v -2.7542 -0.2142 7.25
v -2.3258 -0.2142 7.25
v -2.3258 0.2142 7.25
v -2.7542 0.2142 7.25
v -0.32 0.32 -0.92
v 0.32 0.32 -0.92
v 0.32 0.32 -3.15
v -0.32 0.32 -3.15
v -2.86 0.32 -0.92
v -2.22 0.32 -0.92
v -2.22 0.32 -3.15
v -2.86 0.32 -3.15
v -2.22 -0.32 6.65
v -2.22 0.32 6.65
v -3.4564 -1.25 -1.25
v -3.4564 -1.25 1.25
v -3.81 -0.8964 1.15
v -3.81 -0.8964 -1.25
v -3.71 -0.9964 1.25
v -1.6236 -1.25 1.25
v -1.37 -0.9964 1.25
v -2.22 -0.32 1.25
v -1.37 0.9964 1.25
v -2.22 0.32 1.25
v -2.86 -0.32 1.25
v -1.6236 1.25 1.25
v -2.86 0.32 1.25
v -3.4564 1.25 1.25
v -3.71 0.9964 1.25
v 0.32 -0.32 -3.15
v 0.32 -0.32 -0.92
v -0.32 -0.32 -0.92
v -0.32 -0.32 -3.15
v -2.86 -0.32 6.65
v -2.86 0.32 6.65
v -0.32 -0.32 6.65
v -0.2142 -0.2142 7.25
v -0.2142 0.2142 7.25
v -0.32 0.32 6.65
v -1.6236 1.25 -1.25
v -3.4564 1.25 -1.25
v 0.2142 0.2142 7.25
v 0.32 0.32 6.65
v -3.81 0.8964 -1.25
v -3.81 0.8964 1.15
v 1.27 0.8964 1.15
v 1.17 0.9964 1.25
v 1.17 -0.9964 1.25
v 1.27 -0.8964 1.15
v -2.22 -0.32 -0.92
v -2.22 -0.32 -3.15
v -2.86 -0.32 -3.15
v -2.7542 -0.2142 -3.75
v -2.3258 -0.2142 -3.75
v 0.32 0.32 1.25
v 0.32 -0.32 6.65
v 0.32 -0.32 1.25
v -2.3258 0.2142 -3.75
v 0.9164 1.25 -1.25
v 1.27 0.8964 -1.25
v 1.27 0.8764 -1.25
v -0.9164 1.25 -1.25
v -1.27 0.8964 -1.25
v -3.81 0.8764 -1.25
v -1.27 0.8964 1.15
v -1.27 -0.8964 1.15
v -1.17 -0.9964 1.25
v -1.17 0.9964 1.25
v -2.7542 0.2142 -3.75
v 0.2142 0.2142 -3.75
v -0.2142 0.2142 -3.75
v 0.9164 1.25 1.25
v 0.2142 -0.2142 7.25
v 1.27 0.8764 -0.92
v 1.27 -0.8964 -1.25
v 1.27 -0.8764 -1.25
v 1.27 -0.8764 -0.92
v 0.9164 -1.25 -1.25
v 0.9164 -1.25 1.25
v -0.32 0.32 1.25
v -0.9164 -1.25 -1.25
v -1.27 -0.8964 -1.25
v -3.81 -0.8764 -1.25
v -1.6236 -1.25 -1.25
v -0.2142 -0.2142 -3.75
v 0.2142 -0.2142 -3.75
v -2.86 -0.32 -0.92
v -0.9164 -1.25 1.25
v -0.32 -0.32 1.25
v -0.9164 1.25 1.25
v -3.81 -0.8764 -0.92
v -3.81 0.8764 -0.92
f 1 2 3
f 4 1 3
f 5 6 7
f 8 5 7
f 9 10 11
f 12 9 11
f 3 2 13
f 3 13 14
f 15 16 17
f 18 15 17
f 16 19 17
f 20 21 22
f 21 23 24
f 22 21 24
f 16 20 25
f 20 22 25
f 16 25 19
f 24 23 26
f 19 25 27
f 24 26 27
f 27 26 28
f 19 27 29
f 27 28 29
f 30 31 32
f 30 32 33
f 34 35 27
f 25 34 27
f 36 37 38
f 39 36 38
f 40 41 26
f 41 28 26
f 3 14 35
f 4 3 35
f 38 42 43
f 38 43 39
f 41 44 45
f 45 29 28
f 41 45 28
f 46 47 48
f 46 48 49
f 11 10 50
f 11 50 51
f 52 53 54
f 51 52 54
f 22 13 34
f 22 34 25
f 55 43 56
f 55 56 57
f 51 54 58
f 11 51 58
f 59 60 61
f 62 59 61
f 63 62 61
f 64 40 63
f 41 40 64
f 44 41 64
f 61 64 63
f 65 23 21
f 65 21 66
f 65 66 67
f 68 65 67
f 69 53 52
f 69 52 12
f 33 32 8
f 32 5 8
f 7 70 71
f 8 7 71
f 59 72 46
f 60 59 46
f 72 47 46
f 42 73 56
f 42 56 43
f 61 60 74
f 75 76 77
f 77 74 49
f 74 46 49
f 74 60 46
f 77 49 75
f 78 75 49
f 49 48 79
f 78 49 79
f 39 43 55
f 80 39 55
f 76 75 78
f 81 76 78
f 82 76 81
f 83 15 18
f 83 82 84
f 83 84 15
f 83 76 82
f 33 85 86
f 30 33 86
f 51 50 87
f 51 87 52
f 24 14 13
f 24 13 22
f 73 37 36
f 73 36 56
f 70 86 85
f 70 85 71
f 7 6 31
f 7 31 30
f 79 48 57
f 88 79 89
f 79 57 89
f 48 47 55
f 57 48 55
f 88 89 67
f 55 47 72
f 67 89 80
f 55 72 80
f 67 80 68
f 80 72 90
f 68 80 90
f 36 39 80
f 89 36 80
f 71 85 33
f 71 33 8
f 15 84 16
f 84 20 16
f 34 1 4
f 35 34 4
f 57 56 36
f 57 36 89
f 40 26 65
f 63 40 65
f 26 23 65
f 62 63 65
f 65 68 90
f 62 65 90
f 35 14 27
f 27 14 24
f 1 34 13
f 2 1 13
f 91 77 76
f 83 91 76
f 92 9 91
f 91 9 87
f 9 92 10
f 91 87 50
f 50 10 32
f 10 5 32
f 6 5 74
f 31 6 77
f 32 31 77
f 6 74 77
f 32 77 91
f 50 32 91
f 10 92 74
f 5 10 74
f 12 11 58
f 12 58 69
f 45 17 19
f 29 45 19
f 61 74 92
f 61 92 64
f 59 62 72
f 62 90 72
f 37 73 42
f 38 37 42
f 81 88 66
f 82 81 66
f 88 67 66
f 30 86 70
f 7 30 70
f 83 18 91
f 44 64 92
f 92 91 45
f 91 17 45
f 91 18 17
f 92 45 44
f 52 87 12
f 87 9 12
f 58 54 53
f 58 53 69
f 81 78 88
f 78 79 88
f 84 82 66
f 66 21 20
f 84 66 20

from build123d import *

# Parameters (mm, degrees)
EXTRUDE1_DEPTH          = 1.25
CUT_EXTRUDE3_DEPTH      = 2.25
LPATTERN4_COUNT         = 2
LPATTERN4_PITCH         = 2.54
SKETCH2_W               = 1.752893218
SKETCH2_H               = 0.33
CUT_EXTRUDE1_DEPTH      = 2.27
CUT_EXTRUDE1_DEPTH_BACK = 4.81
SKETCH3_W               = 11
SKETCH3_H               = 0.64
EXTRUDE_THIN1_DEPTH     = 0.32
LPATTERN5_COUNT         = 2
LPATTERN5_PITCH         = 2.54
CHAMFER2_SIZE           = 0.6
CHAMFER2_SIZE2          = 0.105796188
CHAMFER2_PART_2_SIZE    = 0.6
CHAMFER2_PART_2_SIZE2   = 0.105796188
CHAMFER2_PART_3_SIZE    = 0.6
CHAMFER2_PART_3_SIZE2   = 0.105796188
CHAMFER2_PART_4_SIZE    = 0.6
CHAMFER2_PART_4_SIZE2   = 0.105796188
CHAMFER2_PART_5_SIZE    = 0.6
CHAMFER2_PART_5_SIZE2   = 0.105796188
CHAMFER2_PART_6_SIZE    = 0.6
CHAMFER2_PART_6_SIZE2   = 0.105796188
CHAMFER2_PART_7_SIZE    = 0.6
CHAMFER2_PART_7_SIZE2   = 0.105796188
CHAMFER2_PART_8_SIZE    = 0.6
CHAMFER2_PART_8_SIZE2   = 0.105796188
CHAMFER2_PART_9_SIZE    = 0.6
CHAMFER2_PART_9_SIZE2   = 0.105796188
CHAMFER2_PART_10_SIZE   = 0.6
CHAMFER2_PART_10_SIZE2  = 0.105796188
CHAMFER2_PART_11_SIZE   = 0.6
CHAMFER2_PART_11_SIZE2  = 0.105796188
CHAMFER2_PART_12_SIZE   = 0.6
CHAMFER2_PART_12_SIZE2  = 0.105796188
CHAMFER2_PART_13_SIZE   = 0.6
CHAMFER2_PART_13_SIZE2  = 0.105796188
CHAMFER2_PART_14_SIZE   = 0.6
CHAMFER2_PART_14_SIZE2  = 0.105796188
CHAMFER2_PART_15_SIZE   = 0.6
CHAMFER2_PART_15_SIZE2  = 0.105796188
CHAMFER2_PART_16_SIZE   = 0.6
CHAMFER2_PART_16_SIZE2  = 0.105796188


with BuildPart() as part:
    # Sketch1 → Extrude1 (new body, symmetric)
    with BuildSketch(Plane.XY):
        Polygon((-1.27, 0.896446609), (-0.916446609, 1.25), (0.916446609, 1.25), (1.27, 0.896446609), (1.27, -0.896446609), (0.916446609, -1.25), (-0.916446609, -1.25), (-1.27, -0.896446609), align=None)
    extrude1 = extrude(amount=EXTRUDE1_DEPTH, both=True)

    # Sketch4 → Cut-Extrude3 (cut, symmetric)
    with BuildSketch(Plane(origin=(0, 0, 0), x_dir=(1, 0, 0), z_dir=(0, 1, 0))):
        Polygon((-1.27, -1.15), (-1.17, -1.25), (-1.27, -1.25), align=None)
        Polygon((1.17, -1.25), (1.27, -1.15), (1.27, -1.25), align=None)
    cut_extrude3 = extrude(amount=CUT_EXTRUDE3_DEPTH, both=True, mode=Mode.SUBTRACT)

    # LPattern4: Extrude1, Cut-Extrude3 ×2
    with Locations(*[(-i * LPATTERN4_PITCH, 0, 0) for i in range(1, LPATTERN4_COUNT)]):
        add(extrude1)
        add(cut_extrude3, mode=Mode.SUBTRACT)

    # Sketch2 → Cut-Extrude1 (cut, two sides)
    with BuildSketch(Plane(origin=(0, 0, 0), x_dir=(0, -1, 0), z_dir=(1, 0, 0))) as cut_extrude1_sk:
        with Locations((0, 1.085)):
            Rectangle(SKETCH2_W, SKETCH2_H)
    extrude(amount=CUT_EXTRUDE1_DEPTH, mode=Mode.SUBTRACT)
    extrude(cut_extrude1_sk.sketch, amount=-CUT_EXTRUDE1_DEPTH_BACK, mode=Mode.SUBTRACT)

    # Sketch3 → Extrude-Thin1 (add, symmetric)
    with BuildSketch(Plane(origin=(0, 0, 0), x_dir=(0, 0, -1), z_dir=(1, 0, 0))):
        with Locations((-1.75, 0)):
            Rectangle(SKETCH3_W, SKETCH3_H)
    extrude_thin1 = extrude(amount=EXTRUDE_THIN1_DEPTH, both=True)

    # LPattern5: Extrude-Thin1 ×2
    with Locations(*[(-i * LPATTERN5_PITCH, 0, 0) for i in range(1, LPATTERN5_COUNT)]):
        add(extrude_thin1)

    # Chamfer2
    chamfer2_edges = [part.edges().sort_by_distance(p)[0] for p in [
        (0, -0.32, 7.25),
    ]]
    chamfer2_side = [part.faces().sort_by_distance(p)[0] for p in [
        (0, -0.32, 4.25),
    ]]
    chamfer(chamfer2_edges, length=CHAMFER2_SIZE, length2=CHAMFER2_SIZE2, reference=chamfer2_side[0])

    # Chamfer2 part 2
    chamfer2_part_2_edges = [part.edges().sort_by_distance(p)[0] for p in [
        (0, 0.32, -3.75),
    ]]
    chamfer2_part_2_side = [part.faces().sort_by_distance(p)[0] for p in [
        (0, 0.32, -2.335),
    ]]
    chamfer(chamfer2_part_2_edges, length=CHAMFER2_PART_2_SIZE, length2=CHAMFER2_PART_2_SIZE2, reference=chamfer2_part_2_side[0])

    # Chamfer2 part 3
    chamfer2_part_3_edges = [part.edges().sort_by_distance(p)[0] for p in [
        (-0.32, 0, 7.25),
    ]]
    chamfer2_part_3_side = [part.faces().sort_by_distance(p)[0] for p in [
        (-0.32, 0, 4.25),
    ]]
    chamfer(chamfer2_part_3_edges, length=CHAMFER2_PART_3_SIZE, length2=CHAMFER2_PART_3_SIZE2, reference=chamfer2_part_3_side[0])

    # Chamfer2 part 4
    chamfer2_part_4_edges = [part.edges().sort_by_distance(p)[0] for p in [
        (-0.32, 0, -3.75),
    ]]
    chamfer2_part_4_side = [part.faces().sort_by_distance(p)[0] for p in [
        (-0.32, 0, -2.335),
    ]]
    chamfer(chamfer2_part_4_edges, length=CHAMFER2_PART_4_SIZE, length2=CHAMFER2_PART_4_SIZE2, reference=chamfer2_part_4_side[0])

    # Chamfer2 part 5
    chamfer2_part_5_edges = [part.edges().sort_by_distance(p)[0] for p in [
        (0, -0.32, -3.75),
    ]]
    chamfer2_part_5_side = [part.faces().sort_by_distance(p)[0] for p in [
        (0, -0.32, -2.335),
    ]]
    chamfer(chamfer2_part_5_edges, length=CHAMFER2_PART_5_SIZE, length2=CHAMFER2_PART_5_SIZE2, reference=chamfer2_part_5_side[0])

    # Chamfer2 part 6
    chamfer2_part_6_edges = [part.edges().sort_by_distance(p)[0] for p in [
        (0.32, 0, -3.75),
    ]]
    chamfer2_part_6_side = [part.faces().sort_by_distance(p)[0] for p in [
        (0.32, 0, -2.335),
    ]]
    chamfer(chamfer2_part_6_edges, length=CHAMFER2_PART_6_SIZE, length2=CHAMFER2_PART_6_SIZE2, reference=chamfer2_part_6_side[0])

    # Chamfer2 part 7
    chamfer2_part_7_edges = [part.edges().sort_by_distance(p)[0] for p in [
        (0, 0.32, 7.25),
    ]]
    chamfer2_part_7_side = [part.faces().sort_by_distance(p)[0] for p in [
        (0, 0.32, 4.25),
    ]]
    chamfer(chamfer2_part_7_edges, length=CHAMFER2_PART_7_SIZE, length2=CHAMFER2_PART_7_SIZE2, reference=chamfer2_part_7_side[0])

    # Chamfer2 part 8
    chamfer2_part_8_edges = [part.edges().sort_by_distance(p)[0] for p in [
        (0.32, 0, 7.25),
    ]]
    chamfer2_part_8_side = [part.faces().sort_by_distance(p)[0] for p in [
        (0.32, 0, 4.25),
    ]]
    chamfer(chamfer2_part_8_edges, length=CHAMFER2_PART_8_SIZE, length2=CHAMFER2_PART_8_SIZE2, reference=chamfer2_part_8_side[0])

    # Chamfer2 part 9
    chamfer2_part_9_edges = [part.edges().sort_by_distance(p)[0] for p in [
        (-2.54, -0.32, 7.25),
    ]]
    chamfer2_part_9_side = [part.faces().sort_by_distance(p)[0] for p in [
        (-2.54, -0.32, 4.25),
    ]]
    chamfer(chamfer2_part_9_edges, length=CHAMFER2_PART_9_SIZE, length2=CHAMFER2_PART_9_SIZE2, reference=chamfer2_part_9_side[0])

    # Chamfer2 part 10
    chamfer2_part_10_edges = [part.edges().sort_by_distance(p)[0] for p in [
        (-2.54, 0.32, -3.75),
    ]]
    chamfer2_part_10_side = [part.faces().sort_by_distance(p)[0] for p in [
        (-2.54, 0.32, -2.335),
    ]]
    chamfer(chamfer2_part_10_edges, length=CHAMFER2_PART_10_SIZE, length2=CHAMFER2_PART_10_SIZE2, reference=chamfer2_part_10_side[0])

    # Chamfer2 part 11
    chamfer2_part_11_edges = [part.edges().sort_by_distance(p)[0] for p in [
        (-2.86, 0, -3.75),
    ]]
    chamfer2_part_11_side = [part.faces().sort_by_distance(p)[0] for p in [
        (-2.86, 0, -2.335),
    ]]
    chamfer(chamfer2_part_11_edges, length=CHAMFER2_PART_11_SIZE, length2=CHAMFER2_PART_11_SIZE2, reference=chamfer2_part_11_side[0])

    # Chamfer2 part 12
    chamfer2_part_12_edges = [part.edges().sort_by_distance(p)[0] for p in [
        (-2.86, 0, 7.25),
    ]]
    chamfer2_part_12_side = [part.faces().sort_by_distance(p)[0] for p in [
        (-2.86, 0, 4.25),
    ]]
    chamfer(chamfer2_part_12_edges, length=CHAMFER2_PART_12_SIZE, length2=CHAMFER2_PART_12_SIZE2, reference=chamfer2_part_12_side[0])

    # Chamfer2 part 13
    chamfer2_part_13_edges = [part.edges().sort_by_distance(p)[0] for p in [
        (-2.54, -0.32, -3.75),
    ]]
    chamfer2_part_13_side = [part.faces().sort_by_distance(p)[0] for p in [
        (-2.54, -0.32, -2.335),
    ]]
    chamfer(chamfer2_part_13_edges, length=CHAMFER2_PART_13_SIZE, length2=CHAMFER2_PART_13_SIZE2, reference=chamfer2_part_13_side[0])

    # Chamfer2 part 14
    chamfer2_part_14_edges = [part.edges().sort_by_distance(p)[0] for p in [
        (-2.22, 0, -3.75),
    ]]
    chamfer2_part_14_side = [part.faces().sort_by_distance(p)[0] for p in [
        (-2.22, 0, -2.335),
    ]]
    chamfer(chamfer2_part_14_edges, length=CHAMFER2_PART_14_SIZE, length2=CHAMFER2_PART_14_SIZE2, reference=chamfer2_part_14_side[0])

    # Chamfer2 part 15
    chamfer2_part_15_edges = [part.edges().sort_by_distance(p)[0] for p in [
        (-2.54, 0.32, 7.25),
    ]]
    chamfer2_part_15_side = [part.faces().sort_by_distance(p)[0] for p in [
        (-2.54, 0.32, 4.25),
    ]]
    chamfer(chamfer2_part_15_edges, length=CHAMFER2_PART_15_SIZE, length2=CHAMFER2_PART_15_SIZE2, reference=chamfer2_part_15_side[0])

    # Chamfer2 part 16
    chamfer2_part_16_edges = [part.edges().sort_by_distance(p)[0] for p in [
        (-2.22, 0, 7.25),
    ]]
    chamfer2_part_16_side = [part.faces().sort_by_distance(p)[0] for p in [
        (-2.22, 0, 4.25),
    ]]
    chamfer(chamfer2_part_16_edges, length=CHAMFER2_PART_16_SIZE, length2=CHAMFER2_PART_16_SIZE2, reference=chamfer2_part_16_side[0])


solid = part.part
